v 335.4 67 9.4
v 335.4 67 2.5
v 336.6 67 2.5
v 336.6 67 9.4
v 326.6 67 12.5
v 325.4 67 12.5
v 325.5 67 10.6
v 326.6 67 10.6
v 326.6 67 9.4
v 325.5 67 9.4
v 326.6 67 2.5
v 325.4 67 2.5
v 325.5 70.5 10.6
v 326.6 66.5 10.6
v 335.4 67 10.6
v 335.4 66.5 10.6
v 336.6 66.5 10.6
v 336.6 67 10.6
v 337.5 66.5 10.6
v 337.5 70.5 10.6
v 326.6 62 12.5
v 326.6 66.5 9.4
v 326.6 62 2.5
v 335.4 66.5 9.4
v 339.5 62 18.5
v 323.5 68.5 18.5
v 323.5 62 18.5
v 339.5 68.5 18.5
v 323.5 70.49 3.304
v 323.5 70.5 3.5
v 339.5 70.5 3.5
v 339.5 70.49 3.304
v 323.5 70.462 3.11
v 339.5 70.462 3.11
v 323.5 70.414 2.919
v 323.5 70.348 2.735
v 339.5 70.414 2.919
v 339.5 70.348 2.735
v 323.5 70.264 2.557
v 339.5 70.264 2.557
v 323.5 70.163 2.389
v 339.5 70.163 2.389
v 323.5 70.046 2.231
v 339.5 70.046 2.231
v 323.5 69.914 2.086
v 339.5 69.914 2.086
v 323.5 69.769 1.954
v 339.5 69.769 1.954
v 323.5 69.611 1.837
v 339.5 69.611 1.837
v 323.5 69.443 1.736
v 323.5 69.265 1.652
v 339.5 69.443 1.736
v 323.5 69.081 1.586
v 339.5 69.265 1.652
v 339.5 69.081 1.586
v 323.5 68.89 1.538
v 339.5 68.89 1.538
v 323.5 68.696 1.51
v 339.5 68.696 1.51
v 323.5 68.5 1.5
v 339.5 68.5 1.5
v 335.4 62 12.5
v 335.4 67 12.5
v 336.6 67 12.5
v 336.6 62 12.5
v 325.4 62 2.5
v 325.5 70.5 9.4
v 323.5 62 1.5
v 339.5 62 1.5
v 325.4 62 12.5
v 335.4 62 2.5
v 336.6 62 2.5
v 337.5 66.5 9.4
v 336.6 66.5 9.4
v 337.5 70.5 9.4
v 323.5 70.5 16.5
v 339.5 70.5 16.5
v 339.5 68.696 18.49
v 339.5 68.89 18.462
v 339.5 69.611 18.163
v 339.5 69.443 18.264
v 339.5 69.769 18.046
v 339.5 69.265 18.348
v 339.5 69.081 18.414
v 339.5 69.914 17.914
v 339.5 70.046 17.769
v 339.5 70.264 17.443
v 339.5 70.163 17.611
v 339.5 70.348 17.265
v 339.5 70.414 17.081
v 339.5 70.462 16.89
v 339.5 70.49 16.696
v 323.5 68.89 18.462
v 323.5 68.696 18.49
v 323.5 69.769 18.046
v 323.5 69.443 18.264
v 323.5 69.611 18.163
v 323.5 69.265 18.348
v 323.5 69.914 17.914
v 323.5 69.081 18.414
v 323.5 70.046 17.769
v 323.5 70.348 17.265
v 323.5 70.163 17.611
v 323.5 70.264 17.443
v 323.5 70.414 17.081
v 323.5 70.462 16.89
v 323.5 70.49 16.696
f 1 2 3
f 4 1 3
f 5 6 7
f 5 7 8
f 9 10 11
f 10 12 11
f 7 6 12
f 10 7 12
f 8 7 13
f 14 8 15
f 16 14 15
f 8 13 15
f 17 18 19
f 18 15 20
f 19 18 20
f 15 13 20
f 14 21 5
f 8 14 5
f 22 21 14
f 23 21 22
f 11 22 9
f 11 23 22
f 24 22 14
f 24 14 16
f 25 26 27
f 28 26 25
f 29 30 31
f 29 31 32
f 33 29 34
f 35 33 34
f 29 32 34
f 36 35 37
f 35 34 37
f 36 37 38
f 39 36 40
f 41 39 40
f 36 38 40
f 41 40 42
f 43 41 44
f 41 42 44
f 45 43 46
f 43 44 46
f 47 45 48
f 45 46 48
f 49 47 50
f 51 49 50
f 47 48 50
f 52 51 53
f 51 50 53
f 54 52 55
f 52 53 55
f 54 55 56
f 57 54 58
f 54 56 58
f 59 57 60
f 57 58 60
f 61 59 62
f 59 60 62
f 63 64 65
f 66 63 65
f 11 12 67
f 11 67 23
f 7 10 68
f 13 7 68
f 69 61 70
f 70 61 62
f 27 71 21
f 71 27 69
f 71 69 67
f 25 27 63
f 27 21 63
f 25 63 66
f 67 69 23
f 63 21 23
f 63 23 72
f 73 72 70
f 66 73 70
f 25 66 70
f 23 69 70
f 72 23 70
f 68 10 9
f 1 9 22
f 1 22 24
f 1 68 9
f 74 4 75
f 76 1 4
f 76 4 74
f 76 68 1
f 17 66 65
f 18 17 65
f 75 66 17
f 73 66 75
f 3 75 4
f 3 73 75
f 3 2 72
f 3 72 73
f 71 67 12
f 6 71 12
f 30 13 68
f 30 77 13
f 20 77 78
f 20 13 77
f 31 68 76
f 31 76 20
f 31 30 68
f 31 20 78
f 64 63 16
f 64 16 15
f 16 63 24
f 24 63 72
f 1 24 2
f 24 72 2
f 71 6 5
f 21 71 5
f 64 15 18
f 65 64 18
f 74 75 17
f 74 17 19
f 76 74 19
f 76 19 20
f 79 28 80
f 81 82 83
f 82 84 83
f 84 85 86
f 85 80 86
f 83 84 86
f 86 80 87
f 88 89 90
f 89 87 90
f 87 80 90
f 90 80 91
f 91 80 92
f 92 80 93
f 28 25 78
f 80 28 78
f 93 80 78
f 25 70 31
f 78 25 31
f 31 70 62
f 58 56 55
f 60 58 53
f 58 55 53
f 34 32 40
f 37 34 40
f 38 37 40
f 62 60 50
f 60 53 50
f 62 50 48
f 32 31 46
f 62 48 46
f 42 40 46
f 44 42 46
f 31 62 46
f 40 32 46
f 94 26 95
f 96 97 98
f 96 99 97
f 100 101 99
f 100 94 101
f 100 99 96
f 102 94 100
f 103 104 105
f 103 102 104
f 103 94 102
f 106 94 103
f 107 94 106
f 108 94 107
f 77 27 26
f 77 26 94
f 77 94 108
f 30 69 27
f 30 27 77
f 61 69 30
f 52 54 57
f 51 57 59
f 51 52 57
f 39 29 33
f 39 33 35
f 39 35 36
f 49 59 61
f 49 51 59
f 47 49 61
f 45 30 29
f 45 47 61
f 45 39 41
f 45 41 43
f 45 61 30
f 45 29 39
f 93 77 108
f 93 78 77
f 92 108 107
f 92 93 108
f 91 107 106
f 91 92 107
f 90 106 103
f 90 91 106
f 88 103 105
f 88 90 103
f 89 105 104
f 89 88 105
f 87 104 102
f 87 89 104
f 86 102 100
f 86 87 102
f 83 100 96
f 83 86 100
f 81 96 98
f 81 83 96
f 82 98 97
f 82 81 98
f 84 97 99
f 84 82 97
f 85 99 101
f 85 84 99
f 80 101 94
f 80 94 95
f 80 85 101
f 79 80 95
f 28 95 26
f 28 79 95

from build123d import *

# Parameters (mm, degrees)
BOX054_W     = 12
BOX054_H     = 4
BOX054_DEPTH = 1.2
BOX053_W     = 1.2
BOX053_H     = 5
BOX053_DEPTH = 10
BOX052_W     = 1.2
BOX052_H     = 5
BOX052_DEPTH = 10
BOX051_W     = 16
BOX051_H     = 8.5
BOX051_DEPTH = 17
FILLET025_R  = 2


with BuildPart() as cube033:
    # Box054 → Box054 (new body)
    with BuildSketch(Plane(origin=(325.5, 50.5, 9.4), x_dir=(1, 0, 0), z_dir=(0, 0, 1))):
        with Locations((6, 2)):
            Rectangle(BOX054_W, BOX054_H)
    extrude(amount=BOX054_DEPTH)


with BuildPart() as cube032:
    # Box053 → Box053 (new body)
    with BuildSketch(Plane(origin=(335.4, 46, 2.5), x_dir=(1, 0, 0), z_dir=(0, 0, 1))):
        with Locations((0.6, 2.5)):
            Rectangle(BOX053_W, BOX053_H)
    extrude(amount=BOX053_DEPTH)


with BuildPart() as fusion099:
    # Box052 → Box052 (new body)
    with BuildSketch(Plane(origin=(325.4, 46, 2.5), x_dir=(1, 0, 0), z_dir=(0, 0, 1))):
        with Locations((0.6, 2.5)):
            Rectangle(BOX052_W, BOX052_H)
    extrude(amount=BOX052_DEPTH)

    # Fusion099: union Cube032
    add(cube032.part)


with BuildPart() as cut061:
    # Box051 → Box051 (new body)
    with BuildSketch(Plane(origin=(323.5, 46, 1.5), x_dir=(1, 0, 0), z_dir=(0, 0, 1))):
        with Locations((8, 4.25)):
            Rectangle(BOX051_W, BOX051_H)
    extrude(amount=BOX051_DEPTH)

    # Cut060: cut Fusion099
    add(fusion099.part, mode=Mode.SUBTRACT)

    # Fillet025
    fillet025_edges = [cut061.edges().sort_by_distance(p)[0] for p in [
        (331.5, 54.5, 18.5),
        (331.5, 54.5, 1.5),
    ]]
    fillet(fillet025_edges, radius=FILLET025_R)

    # Cut061: cut Cube033
    add(cube033.part, mode=Mode.SUBTRACT)


with BuildPart() as cut061_1:
    # Cut061 placement: moved
    add(cut061.part.moved(Location((0, 16, 0))))


solid = cut061_1.part
